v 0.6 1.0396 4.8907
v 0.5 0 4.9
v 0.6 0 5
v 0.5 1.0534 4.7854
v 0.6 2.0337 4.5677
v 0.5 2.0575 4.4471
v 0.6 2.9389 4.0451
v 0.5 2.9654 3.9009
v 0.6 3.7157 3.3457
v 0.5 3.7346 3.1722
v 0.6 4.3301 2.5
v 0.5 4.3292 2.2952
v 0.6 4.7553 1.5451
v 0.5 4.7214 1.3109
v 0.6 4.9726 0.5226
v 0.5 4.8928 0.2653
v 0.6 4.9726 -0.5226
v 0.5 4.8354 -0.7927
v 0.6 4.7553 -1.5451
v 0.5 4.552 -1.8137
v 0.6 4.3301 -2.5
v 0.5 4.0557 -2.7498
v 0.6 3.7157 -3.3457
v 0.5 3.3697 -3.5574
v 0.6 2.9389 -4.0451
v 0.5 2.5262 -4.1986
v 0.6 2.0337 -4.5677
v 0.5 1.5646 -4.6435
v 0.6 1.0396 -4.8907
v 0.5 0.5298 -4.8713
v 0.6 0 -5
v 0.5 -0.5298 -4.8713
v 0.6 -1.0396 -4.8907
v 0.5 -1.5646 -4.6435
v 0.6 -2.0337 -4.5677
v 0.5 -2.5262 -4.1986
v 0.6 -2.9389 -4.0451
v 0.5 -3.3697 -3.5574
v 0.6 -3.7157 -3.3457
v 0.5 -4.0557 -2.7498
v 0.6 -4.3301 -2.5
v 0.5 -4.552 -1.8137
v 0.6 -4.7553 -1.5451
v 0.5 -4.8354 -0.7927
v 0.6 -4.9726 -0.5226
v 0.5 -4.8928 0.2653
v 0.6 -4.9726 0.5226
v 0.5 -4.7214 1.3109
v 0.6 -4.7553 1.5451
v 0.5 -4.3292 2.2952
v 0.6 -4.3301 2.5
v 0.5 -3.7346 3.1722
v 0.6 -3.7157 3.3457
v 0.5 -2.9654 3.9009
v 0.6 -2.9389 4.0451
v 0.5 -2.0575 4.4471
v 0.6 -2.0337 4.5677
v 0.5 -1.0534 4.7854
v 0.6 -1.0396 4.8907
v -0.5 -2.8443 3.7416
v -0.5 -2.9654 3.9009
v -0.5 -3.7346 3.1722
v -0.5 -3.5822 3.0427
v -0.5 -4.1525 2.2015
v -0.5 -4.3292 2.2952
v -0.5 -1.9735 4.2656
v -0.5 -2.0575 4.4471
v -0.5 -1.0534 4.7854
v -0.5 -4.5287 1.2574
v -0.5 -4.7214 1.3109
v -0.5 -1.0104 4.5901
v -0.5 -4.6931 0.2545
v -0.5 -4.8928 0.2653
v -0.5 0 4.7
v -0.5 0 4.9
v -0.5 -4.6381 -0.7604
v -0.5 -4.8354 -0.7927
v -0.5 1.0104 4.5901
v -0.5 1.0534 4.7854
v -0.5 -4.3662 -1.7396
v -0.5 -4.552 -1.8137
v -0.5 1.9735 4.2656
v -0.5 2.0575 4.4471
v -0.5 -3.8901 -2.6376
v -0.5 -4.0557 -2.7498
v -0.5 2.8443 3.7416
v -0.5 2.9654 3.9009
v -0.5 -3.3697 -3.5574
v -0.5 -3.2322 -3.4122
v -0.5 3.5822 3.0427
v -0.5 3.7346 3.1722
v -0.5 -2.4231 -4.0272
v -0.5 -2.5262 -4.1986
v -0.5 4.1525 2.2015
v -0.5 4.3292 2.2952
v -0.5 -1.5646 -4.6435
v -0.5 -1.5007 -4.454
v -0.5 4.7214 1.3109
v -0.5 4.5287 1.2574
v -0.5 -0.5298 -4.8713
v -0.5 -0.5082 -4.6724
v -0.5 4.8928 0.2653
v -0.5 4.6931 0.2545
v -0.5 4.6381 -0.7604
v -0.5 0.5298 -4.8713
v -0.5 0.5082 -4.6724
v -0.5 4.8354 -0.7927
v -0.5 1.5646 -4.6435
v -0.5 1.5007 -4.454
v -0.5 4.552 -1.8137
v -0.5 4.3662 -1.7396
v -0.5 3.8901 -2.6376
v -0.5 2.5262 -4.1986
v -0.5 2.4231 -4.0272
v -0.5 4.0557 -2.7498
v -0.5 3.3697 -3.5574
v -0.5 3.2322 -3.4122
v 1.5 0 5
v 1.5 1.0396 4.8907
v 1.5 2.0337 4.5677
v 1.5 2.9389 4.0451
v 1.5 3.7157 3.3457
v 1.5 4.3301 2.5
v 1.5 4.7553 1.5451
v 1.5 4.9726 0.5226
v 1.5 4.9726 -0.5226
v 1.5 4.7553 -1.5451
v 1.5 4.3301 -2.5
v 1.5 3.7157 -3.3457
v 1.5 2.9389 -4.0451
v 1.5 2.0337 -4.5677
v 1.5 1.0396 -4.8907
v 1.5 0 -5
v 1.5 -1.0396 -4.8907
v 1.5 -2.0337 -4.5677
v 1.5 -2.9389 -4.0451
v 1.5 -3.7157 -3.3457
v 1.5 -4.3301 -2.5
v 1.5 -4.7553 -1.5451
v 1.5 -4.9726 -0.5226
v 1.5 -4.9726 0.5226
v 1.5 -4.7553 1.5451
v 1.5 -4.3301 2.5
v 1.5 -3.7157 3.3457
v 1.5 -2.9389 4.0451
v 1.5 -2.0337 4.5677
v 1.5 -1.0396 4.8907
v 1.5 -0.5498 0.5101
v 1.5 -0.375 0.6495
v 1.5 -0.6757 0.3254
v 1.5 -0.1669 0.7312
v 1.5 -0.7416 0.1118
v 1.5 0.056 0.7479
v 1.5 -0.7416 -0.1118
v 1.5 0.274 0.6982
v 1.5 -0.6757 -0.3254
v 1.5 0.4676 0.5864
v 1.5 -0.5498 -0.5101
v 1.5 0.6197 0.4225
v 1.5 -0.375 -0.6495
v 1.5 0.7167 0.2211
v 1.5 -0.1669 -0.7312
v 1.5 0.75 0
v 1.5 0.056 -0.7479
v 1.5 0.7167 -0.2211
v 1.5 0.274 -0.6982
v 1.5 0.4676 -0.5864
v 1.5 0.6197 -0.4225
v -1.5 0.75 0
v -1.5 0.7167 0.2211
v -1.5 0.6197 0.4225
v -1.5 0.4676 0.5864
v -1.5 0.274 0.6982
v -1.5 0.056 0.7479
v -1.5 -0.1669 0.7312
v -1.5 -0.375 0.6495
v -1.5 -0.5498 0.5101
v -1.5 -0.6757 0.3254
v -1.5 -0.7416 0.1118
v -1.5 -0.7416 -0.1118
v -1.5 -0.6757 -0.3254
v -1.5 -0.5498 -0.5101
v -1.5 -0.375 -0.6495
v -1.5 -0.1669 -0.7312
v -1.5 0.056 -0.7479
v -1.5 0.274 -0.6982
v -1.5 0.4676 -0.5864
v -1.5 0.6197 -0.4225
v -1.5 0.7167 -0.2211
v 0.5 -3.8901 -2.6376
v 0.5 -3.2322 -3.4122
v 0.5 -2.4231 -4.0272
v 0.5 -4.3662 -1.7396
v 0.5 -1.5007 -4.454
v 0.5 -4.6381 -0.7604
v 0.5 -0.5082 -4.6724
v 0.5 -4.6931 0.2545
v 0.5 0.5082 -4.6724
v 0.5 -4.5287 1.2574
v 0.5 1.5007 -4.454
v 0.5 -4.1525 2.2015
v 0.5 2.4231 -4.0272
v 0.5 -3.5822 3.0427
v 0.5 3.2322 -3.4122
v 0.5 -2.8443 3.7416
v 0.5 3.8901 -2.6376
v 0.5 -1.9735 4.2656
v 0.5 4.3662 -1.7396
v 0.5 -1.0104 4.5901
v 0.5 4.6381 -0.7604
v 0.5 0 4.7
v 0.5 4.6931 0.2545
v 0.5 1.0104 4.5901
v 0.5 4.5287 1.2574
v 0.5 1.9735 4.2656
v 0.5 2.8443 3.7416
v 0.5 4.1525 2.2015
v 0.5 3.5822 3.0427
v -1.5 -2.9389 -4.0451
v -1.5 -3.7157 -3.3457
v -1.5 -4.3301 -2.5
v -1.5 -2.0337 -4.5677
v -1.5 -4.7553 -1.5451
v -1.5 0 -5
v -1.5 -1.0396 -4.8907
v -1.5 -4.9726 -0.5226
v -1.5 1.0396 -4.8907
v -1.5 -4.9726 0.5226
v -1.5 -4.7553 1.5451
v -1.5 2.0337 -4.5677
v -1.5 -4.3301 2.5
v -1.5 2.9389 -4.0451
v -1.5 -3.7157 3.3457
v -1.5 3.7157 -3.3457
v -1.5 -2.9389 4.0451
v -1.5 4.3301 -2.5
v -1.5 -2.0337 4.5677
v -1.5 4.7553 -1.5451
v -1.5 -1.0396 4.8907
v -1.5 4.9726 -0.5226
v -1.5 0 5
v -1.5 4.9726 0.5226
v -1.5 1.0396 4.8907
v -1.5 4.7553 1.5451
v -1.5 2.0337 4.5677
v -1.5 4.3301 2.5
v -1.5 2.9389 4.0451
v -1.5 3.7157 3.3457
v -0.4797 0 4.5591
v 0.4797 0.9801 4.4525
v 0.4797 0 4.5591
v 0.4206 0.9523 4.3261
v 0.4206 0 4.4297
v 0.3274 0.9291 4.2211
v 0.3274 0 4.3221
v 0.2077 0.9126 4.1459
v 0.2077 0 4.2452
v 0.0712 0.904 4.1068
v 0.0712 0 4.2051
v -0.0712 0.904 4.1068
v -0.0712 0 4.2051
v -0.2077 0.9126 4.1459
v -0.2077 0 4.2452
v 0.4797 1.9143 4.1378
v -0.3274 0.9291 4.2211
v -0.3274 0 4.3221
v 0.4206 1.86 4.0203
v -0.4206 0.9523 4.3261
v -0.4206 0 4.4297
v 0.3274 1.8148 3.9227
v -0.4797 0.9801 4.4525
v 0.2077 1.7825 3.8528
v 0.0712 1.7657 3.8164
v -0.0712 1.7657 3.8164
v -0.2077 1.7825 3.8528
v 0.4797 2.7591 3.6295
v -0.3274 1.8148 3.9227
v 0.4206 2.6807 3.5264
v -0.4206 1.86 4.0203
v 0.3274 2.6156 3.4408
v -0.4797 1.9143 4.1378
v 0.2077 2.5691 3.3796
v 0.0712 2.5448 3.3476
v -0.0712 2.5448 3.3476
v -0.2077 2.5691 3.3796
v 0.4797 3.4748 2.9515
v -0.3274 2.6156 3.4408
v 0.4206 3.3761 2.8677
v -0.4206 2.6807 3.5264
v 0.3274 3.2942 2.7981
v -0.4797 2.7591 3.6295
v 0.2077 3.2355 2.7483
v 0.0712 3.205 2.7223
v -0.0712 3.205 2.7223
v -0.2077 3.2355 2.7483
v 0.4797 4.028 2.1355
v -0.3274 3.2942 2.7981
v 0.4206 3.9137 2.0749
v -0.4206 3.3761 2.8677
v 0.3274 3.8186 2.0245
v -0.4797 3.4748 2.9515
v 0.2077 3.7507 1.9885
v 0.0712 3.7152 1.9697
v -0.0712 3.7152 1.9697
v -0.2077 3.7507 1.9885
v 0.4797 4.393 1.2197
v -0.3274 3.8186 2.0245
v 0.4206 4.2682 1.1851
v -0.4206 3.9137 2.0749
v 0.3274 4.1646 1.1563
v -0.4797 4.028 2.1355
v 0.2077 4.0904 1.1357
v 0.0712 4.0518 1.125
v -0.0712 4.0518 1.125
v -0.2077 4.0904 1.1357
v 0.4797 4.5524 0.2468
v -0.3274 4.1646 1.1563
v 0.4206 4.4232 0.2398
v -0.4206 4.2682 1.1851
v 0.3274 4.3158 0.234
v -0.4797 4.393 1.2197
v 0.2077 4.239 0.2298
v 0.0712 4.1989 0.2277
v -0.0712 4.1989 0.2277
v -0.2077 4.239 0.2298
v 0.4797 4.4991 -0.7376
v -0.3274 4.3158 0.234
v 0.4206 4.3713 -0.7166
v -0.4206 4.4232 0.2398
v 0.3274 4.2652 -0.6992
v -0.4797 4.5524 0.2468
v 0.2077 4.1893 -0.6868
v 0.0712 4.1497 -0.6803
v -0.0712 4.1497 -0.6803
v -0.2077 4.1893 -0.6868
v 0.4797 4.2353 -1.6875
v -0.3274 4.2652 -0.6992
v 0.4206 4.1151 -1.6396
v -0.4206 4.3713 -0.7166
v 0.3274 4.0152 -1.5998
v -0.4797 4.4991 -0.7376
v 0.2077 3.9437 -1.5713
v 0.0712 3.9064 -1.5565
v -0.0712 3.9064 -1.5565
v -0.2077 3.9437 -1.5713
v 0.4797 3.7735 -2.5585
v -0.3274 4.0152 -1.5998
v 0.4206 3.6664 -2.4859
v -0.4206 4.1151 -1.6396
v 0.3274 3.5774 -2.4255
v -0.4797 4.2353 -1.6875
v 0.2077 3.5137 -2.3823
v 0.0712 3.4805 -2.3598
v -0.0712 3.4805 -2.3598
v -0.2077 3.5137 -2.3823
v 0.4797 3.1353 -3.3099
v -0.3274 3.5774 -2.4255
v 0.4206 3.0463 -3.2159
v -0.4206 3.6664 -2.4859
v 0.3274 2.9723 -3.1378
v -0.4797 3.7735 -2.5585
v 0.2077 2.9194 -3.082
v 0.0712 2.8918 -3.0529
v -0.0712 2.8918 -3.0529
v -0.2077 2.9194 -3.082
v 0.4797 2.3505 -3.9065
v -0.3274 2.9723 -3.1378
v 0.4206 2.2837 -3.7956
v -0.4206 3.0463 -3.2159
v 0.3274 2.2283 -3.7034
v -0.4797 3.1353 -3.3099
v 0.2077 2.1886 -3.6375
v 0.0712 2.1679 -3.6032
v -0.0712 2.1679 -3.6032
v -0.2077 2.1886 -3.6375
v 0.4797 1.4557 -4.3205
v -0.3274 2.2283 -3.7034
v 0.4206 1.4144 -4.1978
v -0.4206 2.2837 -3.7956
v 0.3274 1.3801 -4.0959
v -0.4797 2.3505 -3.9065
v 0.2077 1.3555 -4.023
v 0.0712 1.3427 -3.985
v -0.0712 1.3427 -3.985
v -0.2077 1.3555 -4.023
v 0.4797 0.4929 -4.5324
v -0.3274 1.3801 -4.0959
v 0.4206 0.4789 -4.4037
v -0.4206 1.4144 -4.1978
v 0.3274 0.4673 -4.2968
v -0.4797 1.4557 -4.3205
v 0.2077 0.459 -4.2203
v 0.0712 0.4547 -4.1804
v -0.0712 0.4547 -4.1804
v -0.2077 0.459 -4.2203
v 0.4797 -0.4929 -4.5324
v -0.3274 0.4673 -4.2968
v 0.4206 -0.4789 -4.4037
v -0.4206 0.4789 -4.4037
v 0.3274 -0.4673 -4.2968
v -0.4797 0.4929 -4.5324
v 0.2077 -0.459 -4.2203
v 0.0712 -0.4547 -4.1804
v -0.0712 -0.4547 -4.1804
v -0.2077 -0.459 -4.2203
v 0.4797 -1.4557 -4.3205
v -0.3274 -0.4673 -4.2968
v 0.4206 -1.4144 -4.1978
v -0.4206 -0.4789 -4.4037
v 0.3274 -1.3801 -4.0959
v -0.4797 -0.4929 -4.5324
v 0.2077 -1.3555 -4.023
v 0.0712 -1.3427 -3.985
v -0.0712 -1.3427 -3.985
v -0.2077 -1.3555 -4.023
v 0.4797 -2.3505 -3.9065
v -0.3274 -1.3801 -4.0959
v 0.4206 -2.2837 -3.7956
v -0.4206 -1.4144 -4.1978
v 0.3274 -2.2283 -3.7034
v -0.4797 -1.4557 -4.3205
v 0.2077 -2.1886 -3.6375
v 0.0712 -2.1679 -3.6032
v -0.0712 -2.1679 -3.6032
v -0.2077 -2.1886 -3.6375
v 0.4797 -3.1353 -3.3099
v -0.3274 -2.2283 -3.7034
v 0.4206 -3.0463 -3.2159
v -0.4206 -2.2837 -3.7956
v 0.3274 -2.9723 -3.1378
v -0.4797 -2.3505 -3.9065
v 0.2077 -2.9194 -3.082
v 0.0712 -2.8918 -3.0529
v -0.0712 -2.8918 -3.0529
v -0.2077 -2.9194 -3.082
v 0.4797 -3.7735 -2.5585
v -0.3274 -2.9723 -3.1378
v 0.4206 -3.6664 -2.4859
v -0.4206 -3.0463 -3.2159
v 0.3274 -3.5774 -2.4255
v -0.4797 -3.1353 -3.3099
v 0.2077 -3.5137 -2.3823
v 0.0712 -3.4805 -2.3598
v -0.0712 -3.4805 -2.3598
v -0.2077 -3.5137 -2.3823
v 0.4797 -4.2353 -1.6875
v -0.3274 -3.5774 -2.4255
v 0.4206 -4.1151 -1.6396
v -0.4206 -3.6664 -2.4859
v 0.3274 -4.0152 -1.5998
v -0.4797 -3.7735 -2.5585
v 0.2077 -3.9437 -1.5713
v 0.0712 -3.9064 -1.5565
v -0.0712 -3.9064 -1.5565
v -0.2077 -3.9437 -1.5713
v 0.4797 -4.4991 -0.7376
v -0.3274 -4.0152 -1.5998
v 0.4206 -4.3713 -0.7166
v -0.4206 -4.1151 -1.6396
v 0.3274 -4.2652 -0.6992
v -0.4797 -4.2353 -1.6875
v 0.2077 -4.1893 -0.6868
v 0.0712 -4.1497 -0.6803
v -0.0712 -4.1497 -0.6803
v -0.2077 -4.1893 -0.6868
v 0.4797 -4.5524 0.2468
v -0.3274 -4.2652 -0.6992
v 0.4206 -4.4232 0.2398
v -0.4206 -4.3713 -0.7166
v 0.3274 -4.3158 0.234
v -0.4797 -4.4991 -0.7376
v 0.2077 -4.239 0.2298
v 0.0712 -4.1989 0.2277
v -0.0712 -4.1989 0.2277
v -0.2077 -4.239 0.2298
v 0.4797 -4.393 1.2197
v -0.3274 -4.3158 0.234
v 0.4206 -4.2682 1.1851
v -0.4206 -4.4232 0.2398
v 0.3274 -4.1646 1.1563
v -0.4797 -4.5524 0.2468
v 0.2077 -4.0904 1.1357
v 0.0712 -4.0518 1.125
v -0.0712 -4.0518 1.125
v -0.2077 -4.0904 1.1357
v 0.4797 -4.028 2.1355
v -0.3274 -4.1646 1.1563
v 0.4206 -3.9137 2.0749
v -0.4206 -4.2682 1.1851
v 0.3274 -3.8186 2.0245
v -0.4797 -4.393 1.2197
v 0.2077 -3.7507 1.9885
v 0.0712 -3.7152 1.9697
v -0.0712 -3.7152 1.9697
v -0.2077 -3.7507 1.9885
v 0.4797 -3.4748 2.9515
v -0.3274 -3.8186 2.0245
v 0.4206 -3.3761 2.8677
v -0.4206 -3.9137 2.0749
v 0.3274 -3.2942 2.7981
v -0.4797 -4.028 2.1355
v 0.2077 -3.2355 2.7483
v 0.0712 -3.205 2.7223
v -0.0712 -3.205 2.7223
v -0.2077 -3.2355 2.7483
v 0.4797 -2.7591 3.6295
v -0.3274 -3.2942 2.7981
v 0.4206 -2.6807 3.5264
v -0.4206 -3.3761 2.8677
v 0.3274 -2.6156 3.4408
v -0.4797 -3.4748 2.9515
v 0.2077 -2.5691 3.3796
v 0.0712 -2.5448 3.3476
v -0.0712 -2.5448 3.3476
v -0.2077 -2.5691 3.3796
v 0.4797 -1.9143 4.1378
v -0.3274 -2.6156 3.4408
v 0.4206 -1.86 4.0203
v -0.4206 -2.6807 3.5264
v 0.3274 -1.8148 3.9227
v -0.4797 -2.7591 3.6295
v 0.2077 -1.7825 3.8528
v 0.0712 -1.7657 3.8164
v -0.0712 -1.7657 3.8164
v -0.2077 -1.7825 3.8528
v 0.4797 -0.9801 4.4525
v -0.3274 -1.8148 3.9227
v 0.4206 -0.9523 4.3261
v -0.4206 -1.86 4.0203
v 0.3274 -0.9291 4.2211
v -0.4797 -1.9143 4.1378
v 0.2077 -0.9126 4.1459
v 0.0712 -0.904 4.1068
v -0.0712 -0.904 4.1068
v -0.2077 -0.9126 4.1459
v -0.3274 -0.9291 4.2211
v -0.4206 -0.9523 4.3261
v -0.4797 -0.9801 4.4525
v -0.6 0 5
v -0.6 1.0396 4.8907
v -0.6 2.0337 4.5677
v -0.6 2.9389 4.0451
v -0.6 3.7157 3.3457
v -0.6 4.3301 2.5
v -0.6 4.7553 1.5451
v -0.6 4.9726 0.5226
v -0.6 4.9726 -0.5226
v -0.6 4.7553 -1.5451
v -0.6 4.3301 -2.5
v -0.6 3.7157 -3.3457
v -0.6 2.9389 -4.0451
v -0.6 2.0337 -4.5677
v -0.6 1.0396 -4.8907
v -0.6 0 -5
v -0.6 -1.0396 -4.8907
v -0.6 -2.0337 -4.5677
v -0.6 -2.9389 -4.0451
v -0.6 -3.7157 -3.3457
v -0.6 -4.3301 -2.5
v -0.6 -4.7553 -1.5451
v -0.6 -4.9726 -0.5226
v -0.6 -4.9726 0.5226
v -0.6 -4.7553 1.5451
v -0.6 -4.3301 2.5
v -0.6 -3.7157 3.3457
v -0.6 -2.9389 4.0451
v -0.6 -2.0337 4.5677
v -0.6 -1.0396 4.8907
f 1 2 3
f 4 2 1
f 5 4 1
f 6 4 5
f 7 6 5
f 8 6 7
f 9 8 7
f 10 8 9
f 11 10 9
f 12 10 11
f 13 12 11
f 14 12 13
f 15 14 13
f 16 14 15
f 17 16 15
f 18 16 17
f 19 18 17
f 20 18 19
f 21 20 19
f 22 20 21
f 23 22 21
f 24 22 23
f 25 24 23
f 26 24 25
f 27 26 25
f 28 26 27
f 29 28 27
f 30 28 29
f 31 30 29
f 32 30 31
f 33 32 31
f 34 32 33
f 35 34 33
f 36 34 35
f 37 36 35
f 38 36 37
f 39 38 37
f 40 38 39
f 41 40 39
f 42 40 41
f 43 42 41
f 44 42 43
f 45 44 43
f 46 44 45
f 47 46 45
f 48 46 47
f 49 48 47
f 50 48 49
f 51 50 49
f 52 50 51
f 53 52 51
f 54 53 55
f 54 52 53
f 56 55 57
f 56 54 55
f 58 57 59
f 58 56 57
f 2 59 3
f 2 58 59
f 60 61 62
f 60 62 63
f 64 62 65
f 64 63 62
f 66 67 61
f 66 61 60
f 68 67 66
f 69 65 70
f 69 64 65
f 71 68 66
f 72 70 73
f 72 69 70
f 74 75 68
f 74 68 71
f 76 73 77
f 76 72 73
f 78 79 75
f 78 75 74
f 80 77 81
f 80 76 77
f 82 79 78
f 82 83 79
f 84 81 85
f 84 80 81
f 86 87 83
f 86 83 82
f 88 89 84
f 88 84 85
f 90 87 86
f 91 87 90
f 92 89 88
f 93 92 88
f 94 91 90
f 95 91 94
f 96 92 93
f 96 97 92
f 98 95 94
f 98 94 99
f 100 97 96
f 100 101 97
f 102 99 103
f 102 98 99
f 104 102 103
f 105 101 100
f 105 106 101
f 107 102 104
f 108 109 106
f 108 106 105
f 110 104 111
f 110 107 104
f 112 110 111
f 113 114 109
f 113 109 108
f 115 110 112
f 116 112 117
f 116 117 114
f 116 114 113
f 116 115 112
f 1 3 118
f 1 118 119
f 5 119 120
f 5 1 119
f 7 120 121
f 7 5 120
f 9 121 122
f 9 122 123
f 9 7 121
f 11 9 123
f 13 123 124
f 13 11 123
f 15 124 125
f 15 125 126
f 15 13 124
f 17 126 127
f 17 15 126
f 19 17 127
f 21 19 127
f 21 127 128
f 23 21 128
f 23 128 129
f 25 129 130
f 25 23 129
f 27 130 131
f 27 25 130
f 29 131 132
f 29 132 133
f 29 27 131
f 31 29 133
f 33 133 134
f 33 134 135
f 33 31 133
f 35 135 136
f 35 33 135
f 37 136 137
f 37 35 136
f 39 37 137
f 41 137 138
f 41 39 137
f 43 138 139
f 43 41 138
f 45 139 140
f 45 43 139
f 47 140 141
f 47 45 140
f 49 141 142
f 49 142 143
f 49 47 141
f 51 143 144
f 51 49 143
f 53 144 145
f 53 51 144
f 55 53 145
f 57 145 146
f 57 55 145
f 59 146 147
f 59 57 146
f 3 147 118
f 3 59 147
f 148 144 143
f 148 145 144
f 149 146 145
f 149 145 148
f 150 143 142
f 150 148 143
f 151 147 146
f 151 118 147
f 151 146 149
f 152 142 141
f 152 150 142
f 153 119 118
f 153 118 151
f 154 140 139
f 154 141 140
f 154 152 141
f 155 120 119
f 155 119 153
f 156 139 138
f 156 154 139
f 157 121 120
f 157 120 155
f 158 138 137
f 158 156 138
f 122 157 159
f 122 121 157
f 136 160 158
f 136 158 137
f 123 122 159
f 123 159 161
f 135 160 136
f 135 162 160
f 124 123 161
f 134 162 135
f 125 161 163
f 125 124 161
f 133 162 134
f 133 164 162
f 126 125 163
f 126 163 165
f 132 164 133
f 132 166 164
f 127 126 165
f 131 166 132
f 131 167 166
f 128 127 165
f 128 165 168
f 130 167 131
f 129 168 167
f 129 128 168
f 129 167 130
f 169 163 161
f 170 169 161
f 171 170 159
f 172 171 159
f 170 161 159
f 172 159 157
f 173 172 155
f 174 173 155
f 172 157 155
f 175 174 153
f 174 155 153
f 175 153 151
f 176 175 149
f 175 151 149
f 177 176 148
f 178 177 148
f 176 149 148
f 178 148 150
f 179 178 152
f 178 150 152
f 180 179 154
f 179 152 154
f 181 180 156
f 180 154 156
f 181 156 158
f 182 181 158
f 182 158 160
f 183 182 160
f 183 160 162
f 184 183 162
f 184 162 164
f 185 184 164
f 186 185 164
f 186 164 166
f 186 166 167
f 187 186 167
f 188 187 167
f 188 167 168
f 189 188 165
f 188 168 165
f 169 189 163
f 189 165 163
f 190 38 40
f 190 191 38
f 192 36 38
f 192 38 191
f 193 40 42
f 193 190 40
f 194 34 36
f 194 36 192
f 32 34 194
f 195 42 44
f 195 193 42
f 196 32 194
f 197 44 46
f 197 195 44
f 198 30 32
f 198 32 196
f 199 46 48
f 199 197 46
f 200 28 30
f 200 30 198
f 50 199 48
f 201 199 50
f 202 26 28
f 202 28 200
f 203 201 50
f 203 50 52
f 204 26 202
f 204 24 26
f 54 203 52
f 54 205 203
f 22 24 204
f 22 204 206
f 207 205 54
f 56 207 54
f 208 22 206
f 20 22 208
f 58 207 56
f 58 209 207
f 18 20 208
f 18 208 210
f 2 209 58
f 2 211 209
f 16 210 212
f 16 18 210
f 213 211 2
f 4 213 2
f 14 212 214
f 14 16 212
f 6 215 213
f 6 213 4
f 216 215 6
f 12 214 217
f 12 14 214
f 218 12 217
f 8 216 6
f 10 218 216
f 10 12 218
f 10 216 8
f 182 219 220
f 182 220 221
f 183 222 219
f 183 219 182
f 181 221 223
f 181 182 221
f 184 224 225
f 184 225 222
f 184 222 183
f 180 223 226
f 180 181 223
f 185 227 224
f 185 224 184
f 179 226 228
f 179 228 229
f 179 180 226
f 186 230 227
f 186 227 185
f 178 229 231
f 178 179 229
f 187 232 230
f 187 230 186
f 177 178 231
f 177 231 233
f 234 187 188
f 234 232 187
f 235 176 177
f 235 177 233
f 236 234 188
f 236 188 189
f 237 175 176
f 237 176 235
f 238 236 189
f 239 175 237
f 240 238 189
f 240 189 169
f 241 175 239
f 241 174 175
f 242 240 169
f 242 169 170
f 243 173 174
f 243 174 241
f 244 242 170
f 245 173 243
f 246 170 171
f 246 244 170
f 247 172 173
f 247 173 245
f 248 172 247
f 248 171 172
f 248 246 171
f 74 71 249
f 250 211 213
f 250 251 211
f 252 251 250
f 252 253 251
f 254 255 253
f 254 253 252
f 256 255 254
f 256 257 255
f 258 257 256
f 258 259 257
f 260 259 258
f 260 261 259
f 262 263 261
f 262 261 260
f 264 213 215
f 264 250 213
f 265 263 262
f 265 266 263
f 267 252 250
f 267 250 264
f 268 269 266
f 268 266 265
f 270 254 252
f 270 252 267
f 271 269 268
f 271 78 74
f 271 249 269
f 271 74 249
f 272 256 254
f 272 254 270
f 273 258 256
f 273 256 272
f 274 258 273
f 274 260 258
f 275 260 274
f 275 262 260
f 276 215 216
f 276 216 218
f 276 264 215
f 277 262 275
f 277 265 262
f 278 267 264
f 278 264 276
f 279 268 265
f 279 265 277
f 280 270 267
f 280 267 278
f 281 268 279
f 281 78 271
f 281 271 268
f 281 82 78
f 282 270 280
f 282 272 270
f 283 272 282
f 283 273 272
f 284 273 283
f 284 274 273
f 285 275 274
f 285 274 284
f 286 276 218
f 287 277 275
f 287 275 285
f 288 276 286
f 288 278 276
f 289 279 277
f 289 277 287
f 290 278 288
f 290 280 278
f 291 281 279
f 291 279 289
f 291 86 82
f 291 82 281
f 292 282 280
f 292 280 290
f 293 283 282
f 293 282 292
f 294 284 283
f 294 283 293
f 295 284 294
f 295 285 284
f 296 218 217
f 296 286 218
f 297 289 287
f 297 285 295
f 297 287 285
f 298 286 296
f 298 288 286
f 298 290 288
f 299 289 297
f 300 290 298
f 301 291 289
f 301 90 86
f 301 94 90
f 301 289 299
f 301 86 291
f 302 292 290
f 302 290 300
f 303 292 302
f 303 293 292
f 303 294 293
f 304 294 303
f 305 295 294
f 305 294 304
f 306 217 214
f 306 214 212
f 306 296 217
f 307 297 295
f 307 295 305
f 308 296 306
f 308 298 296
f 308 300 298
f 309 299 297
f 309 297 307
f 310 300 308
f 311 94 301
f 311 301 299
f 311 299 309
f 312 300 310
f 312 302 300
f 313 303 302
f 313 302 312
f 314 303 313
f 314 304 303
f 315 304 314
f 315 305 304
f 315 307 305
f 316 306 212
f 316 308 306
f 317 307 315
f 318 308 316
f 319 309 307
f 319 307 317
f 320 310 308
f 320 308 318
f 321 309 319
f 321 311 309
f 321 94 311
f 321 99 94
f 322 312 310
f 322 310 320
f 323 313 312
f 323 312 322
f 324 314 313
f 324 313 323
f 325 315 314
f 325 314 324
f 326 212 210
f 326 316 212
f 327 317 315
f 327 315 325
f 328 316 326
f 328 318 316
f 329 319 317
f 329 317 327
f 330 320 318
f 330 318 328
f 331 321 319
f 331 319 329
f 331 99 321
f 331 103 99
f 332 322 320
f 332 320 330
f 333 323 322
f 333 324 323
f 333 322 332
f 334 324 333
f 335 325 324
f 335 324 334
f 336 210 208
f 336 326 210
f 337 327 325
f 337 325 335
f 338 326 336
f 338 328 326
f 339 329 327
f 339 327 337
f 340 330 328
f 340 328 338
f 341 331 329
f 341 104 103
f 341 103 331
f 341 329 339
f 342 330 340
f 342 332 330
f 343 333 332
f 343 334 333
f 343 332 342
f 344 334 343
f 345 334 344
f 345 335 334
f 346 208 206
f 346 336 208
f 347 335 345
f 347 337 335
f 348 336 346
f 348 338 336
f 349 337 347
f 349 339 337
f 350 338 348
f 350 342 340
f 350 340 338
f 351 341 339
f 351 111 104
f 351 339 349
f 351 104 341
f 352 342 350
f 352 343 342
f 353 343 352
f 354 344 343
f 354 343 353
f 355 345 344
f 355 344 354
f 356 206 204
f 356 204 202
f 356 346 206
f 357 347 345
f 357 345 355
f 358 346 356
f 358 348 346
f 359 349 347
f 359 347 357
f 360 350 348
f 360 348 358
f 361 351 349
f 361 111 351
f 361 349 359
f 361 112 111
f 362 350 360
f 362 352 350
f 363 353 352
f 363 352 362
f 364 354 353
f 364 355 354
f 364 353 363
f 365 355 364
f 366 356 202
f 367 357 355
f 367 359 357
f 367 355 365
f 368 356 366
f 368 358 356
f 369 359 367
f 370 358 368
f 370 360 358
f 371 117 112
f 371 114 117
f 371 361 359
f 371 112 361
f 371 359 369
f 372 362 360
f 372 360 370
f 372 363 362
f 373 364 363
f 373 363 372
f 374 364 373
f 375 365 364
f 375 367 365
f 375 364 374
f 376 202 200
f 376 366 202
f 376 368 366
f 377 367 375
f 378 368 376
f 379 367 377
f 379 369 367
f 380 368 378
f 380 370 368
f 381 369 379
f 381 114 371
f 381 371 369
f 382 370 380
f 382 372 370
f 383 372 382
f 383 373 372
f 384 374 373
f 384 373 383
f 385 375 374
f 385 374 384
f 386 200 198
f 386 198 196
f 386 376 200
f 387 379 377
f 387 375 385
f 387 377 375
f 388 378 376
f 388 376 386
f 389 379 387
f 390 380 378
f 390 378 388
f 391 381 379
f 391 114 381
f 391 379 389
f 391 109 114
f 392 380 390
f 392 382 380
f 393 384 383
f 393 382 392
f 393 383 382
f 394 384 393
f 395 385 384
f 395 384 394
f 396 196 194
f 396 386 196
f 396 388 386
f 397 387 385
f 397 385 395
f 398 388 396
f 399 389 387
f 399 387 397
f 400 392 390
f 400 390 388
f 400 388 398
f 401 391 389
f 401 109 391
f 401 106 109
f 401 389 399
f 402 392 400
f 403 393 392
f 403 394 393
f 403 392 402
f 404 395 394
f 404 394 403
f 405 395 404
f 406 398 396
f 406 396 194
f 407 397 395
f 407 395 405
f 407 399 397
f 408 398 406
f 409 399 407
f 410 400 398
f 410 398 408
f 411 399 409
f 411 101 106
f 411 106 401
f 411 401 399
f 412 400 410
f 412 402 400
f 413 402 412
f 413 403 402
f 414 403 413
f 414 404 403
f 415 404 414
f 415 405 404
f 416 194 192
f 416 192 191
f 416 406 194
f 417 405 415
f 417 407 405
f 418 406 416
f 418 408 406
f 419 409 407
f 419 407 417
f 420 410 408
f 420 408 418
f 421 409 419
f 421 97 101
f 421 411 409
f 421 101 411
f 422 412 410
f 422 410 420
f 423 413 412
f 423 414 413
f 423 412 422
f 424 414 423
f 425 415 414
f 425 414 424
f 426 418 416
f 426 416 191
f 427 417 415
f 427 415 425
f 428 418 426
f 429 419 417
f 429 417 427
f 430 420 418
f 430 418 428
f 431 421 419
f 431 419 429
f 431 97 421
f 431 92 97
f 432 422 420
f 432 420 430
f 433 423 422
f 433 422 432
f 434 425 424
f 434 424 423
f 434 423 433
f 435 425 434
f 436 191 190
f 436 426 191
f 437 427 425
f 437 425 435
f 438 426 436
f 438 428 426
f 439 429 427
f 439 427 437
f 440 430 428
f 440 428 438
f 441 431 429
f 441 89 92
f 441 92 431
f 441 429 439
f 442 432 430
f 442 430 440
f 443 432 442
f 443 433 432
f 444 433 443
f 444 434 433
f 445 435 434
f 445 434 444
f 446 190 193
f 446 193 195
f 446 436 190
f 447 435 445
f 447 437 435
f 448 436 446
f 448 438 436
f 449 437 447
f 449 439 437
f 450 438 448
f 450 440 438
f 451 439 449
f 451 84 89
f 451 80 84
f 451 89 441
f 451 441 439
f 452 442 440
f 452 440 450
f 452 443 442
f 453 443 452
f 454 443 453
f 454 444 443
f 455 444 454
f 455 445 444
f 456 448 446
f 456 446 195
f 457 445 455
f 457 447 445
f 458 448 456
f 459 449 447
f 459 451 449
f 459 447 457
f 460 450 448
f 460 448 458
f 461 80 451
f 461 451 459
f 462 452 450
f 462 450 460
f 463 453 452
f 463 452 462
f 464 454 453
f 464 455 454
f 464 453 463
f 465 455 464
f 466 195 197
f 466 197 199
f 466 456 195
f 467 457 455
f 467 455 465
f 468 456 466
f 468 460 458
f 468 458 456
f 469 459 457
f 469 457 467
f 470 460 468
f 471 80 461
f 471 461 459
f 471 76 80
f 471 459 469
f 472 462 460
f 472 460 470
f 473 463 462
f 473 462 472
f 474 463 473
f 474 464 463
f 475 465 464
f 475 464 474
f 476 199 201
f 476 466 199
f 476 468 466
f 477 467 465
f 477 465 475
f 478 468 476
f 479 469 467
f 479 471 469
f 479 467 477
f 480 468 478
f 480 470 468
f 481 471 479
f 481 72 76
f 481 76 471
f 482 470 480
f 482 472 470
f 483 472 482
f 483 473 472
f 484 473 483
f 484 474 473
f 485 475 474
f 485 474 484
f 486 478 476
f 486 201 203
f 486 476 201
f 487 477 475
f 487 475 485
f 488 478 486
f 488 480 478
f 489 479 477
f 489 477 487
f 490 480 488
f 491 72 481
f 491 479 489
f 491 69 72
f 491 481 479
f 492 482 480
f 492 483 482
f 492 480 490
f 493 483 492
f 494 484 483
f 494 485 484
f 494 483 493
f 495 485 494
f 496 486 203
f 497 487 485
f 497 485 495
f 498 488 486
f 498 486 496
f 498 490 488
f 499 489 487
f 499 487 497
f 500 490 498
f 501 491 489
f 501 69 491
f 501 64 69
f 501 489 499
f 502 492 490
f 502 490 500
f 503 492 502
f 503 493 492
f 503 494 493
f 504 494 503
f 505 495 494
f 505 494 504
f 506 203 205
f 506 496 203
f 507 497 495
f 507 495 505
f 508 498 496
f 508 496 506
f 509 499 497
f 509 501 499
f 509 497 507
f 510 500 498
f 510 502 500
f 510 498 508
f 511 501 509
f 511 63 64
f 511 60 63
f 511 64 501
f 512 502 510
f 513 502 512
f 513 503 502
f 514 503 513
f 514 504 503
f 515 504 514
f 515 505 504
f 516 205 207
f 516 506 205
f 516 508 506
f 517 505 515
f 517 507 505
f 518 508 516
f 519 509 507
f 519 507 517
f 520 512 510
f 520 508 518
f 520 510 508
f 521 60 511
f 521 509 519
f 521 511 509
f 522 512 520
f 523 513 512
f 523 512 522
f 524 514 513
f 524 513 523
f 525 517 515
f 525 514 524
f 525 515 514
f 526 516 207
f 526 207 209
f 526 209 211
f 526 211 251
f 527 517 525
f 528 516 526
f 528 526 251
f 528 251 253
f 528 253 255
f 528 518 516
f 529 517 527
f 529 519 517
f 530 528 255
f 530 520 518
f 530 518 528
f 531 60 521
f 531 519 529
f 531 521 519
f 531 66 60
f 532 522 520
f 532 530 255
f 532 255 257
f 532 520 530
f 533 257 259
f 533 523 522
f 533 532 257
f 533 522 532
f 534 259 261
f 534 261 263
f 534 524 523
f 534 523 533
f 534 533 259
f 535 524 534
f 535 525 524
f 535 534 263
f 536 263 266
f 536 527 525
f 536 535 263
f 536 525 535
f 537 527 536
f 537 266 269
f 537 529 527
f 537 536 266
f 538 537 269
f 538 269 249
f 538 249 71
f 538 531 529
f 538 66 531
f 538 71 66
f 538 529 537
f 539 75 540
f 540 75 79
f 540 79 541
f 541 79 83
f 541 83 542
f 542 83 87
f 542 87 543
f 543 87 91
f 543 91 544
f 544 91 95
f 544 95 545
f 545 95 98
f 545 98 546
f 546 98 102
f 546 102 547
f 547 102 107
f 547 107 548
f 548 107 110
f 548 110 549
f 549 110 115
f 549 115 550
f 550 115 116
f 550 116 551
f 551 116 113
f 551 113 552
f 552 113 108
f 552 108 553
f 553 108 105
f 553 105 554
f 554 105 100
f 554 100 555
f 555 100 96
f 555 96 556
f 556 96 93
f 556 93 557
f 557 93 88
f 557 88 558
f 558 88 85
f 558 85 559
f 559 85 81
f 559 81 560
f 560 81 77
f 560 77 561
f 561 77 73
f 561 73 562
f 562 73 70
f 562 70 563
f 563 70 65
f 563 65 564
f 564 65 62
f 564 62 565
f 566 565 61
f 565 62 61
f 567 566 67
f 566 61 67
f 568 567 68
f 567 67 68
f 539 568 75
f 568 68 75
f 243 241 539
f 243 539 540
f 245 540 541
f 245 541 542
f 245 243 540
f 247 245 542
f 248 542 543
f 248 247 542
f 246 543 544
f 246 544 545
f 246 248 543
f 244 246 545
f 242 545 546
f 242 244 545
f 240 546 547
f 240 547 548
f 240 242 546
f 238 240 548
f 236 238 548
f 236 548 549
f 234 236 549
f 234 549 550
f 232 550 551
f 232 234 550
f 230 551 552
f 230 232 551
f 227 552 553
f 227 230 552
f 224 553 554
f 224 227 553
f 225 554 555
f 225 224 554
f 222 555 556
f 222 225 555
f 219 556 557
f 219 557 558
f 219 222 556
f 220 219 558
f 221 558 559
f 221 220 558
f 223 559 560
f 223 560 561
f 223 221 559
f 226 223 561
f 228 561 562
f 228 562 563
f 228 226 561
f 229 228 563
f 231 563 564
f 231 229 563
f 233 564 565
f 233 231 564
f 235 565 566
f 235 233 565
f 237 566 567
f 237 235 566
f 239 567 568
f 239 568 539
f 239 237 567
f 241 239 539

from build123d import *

# Parameters (mm, degrees)
F2_R     = 0.75
F3_DEPTH = 3
F4_SIZE  = 0.1


with BuildPart() as f1:
    # F0 (on Front) → F1 (revolve)
    with BuildSketch(Plane.XZ):
        with BuildLine():
            Line((-1.5, 0), (0, 0))
            Line((0, 0), (1.5, 0))
            Line((1.5, 0), (1.5, 5))
            Line((1.5, 5), (0.5, 5))
            Line((0.5, 5), (0.5, 4.7))
            ThreePointArc((0.5, 4.7), (0, 4.2), (-0.5, 4.7))
            Line((-0.5, 4.7), (-0.5, 5))
            Line((-0.5, 5), (-1.5, 5))
            Line((-1.5, 5), (-1.5, 0))
        make_face()
    revolve(axis=Axis((-0.75, 0, 0), (-1, 0, 0)))

    # F2 (on face) → F3 (cut, through all)
    with BuildSketch(Plane.YZ.offset(1.5)):
        Circle(F2_R)
    extrude(amount=-F3_DEPTH, mode=Mode.SUBTRACT)

    # F4
    f4_edges = [f1.edges().sort_by_distance(p)[0] for p in [
        (0.5, 0, -5),
        (-0.5, 0, -5),
    ]]
    chamfer(f4_edges, length=F4_SIZE)


solid = f1.part
